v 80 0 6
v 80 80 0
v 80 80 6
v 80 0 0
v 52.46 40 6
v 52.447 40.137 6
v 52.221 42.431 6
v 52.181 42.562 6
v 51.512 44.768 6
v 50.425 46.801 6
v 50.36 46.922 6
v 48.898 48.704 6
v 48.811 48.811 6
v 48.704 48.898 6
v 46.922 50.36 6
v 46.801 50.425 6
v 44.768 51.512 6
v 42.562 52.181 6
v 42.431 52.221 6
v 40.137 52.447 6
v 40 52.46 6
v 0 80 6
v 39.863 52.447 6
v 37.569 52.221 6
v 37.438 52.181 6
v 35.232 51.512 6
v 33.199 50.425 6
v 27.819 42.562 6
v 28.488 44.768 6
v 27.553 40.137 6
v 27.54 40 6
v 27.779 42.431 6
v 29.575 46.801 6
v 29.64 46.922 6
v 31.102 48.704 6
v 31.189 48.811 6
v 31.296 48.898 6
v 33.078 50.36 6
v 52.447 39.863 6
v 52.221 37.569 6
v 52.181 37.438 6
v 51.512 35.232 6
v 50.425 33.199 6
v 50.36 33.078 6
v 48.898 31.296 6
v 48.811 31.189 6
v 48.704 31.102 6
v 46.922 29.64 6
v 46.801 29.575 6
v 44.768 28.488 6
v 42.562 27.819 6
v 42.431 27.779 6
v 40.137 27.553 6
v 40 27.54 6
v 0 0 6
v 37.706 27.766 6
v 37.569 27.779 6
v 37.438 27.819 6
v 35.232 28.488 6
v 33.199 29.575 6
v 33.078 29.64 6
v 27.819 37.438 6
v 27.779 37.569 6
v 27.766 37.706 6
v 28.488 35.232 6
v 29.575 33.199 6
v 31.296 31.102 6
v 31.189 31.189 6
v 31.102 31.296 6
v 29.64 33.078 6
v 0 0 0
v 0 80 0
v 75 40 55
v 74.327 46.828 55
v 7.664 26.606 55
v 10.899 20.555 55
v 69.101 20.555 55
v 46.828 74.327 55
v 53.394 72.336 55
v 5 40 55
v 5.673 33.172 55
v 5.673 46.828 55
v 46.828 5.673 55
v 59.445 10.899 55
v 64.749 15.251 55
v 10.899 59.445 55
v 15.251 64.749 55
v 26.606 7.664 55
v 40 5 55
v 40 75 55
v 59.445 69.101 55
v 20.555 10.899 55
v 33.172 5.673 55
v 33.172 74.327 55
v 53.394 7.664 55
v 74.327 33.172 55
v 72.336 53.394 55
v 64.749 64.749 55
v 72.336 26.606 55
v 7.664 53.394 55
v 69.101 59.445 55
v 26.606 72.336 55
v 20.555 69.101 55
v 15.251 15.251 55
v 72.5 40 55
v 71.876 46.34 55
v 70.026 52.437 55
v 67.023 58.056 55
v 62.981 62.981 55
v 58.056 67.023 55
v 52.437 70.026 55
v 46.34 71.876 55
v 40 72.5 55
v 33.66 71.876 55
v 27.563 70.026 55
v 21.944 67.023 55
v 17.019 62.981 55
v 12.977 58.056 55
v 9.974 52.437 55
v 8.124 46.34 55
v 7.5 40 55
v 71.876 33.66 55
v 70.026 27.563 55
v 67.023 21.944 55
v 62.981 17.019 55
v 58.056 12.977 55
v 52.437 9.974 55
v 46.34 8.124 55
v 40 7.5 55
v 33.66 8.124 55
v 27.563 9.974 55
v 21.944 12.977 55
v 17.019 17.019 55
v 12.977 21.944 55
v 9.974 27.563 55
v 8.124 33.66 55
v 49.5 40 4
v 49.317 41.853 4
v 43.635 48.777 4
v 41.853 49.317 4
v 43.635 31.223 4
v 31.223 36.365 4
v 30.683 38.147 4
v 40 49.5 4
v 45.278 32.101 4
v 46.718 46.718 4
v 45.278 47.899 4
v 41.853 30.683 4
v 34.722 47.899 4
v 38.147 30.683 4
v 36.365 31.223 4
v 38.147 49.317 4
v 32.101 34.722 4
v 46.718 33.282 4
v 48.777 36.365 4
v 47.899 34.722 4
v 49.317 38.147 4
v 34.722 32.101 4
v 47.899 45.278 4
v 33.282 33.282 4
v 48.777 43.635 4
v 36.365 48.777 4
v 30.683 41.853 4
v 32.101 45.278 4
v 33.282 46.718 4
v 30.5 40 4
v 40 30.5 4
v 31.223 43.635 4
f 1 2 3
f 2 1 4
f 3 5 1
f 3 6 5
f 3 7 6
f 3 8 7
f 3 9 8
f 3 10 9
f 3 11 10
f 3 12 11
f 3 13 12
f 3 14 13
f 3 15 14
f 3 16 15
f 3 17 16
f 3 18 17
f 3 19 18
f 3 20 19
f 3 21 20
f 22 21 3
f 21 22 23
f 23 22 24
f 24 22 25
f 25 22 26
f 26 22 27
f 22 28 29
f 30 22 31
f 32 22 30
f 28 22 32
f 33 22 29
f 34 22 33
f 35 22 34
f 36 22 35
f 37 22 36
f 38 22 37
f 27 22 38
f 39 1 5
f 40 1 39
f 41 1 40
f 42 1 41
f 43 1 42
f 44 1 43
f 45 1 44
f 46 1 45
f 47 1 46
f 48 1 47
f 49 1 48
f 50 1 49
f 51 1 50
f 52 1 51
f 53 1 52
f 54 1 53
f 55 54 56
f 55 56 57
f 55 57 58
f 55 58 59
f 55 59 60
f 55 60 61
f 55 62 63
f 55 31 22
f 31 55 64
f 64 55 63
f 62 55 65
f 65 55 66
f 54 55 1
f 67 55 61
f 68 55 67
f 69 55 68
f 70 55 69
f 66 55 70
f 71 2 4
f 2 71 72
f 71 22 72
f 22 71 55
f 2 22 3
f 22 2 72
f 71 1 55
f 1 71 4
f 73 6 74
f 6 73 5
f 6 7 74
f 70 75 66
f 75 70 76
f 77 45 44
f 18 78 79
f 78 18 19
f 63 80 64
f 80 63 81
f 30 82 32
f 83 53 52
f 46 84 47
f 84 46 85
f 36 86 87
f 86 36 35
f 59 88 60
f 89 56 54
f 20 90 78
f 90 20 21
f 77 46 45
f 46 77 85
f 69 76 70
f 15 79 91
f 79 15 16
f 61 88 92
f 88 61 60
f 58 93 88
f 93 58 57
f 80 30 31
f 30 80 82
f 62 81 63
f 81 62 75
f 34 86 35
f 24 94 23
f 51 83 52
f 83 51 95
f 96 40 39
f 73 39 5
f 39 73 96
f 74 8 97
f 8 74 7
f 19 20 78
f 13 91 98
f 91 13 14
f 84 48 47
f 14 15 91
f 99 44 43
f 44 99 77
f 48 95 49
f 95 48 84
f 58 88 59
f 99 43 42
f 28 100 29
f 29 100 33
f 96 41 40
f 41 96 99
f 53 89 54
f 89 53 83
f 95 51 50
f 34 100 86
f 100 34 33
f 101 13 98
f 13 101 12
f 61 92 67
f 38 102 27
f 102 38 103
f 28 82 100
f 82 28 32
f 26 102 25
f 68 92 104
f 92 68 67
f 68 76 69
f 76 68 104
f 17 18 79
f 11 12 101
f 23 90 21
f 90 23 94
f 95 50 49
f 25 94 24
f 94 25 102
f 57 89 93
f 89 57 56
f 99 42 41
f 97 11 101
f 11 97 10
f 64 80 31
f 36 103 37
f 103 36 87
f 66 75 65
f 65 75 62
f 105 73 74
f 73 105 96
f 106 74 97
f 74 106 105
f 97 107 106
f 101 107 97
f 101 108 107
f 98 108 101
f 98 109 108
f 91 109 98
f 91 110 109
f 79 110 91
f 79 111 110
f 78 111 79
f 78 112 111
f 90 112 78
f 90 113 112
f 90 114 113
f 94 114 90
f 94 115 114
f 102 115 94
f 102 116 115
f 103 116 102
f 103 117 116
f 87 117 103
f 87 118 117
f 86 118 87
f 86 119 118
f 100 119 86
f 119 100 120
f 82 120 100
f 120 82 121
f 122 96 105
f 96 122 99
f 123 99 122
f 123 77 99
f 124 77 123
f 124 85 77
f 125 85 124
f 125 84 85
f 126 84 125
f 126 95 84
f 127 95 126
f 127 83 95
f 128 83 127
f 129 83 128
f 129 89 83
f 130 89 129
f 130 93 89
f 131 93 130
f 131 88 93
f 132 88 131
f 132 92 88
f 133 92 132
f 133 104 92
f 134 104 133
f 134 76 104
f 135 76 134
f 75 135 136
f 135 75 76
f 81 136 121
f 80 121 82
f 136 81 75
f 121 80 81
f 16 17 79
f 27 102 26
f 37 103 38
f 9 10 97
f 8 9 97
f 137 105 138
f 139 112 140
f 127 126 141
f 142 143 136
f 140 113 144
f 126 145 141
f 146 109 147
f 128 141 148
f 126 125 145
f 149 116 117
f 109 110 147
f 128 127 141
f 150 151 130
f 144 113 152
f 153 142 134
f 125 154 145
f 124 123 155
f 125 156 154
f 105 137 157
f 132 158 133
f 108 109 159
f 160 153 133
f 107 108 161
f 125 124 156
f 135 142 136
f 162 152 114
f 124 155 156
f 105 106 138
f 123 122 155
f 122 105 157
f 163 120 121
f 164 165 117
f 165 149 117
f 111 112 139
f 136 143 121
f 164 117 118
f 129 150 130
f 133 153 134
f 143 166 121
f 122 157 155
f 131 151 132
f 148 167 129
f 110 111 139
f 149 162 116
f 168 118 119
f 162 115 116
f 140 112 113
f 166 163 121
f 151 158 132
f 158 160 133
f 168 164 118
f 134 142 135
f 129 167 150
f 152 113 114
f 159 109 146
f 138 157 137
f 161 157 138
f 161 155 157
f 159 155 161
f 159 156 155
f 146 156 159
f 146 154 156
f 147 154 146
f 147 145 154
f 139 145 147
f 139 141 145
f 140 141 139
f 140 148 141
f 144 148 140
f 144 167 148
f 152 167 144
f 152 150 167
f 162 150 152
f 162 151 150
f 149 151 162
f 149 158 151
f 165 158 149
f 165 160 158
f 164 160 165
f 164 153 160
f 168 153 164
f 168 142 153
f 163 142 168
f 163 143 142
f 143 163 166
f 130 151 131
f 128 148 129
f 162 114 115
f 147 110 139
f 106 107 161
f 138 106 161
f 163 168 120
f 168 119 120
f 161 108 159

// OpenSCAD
$fn = 32;

// ----------------------------------------------------------------------
// Hopper: funnel with square flange
// ----------------------------------------------------------------------

// --- parameters (mm) ---
fl = 80;                  // flange side, X and Y
fl_t = 6;                 // flange thickness
cone_h = 50;              // cone height above the flange
top_d = 70;               // cone mouth diameter
bot_d = 24;               // cone spout diameter
wall = 2.5;               // cone wall thickness

bore_d = bot_d - 2 * wall;  // spout bore diameter
total_h = fl_t + cone_h - 1;  // overall height

difference() {
  union() {
    cube([fl, fl, fl_t]);
    translate([fl / 2, fl / 2, fl_t - 1])
      cylinder(h = cone_h, d1 = bot_d, d2 = top_d);
  }
  translate([fl / 2, fl / 2, fl_t - 2])
    cylinder(h = cone_h + 1, d1 = bore_d, d2 = top_d - 2 * wall);
}
